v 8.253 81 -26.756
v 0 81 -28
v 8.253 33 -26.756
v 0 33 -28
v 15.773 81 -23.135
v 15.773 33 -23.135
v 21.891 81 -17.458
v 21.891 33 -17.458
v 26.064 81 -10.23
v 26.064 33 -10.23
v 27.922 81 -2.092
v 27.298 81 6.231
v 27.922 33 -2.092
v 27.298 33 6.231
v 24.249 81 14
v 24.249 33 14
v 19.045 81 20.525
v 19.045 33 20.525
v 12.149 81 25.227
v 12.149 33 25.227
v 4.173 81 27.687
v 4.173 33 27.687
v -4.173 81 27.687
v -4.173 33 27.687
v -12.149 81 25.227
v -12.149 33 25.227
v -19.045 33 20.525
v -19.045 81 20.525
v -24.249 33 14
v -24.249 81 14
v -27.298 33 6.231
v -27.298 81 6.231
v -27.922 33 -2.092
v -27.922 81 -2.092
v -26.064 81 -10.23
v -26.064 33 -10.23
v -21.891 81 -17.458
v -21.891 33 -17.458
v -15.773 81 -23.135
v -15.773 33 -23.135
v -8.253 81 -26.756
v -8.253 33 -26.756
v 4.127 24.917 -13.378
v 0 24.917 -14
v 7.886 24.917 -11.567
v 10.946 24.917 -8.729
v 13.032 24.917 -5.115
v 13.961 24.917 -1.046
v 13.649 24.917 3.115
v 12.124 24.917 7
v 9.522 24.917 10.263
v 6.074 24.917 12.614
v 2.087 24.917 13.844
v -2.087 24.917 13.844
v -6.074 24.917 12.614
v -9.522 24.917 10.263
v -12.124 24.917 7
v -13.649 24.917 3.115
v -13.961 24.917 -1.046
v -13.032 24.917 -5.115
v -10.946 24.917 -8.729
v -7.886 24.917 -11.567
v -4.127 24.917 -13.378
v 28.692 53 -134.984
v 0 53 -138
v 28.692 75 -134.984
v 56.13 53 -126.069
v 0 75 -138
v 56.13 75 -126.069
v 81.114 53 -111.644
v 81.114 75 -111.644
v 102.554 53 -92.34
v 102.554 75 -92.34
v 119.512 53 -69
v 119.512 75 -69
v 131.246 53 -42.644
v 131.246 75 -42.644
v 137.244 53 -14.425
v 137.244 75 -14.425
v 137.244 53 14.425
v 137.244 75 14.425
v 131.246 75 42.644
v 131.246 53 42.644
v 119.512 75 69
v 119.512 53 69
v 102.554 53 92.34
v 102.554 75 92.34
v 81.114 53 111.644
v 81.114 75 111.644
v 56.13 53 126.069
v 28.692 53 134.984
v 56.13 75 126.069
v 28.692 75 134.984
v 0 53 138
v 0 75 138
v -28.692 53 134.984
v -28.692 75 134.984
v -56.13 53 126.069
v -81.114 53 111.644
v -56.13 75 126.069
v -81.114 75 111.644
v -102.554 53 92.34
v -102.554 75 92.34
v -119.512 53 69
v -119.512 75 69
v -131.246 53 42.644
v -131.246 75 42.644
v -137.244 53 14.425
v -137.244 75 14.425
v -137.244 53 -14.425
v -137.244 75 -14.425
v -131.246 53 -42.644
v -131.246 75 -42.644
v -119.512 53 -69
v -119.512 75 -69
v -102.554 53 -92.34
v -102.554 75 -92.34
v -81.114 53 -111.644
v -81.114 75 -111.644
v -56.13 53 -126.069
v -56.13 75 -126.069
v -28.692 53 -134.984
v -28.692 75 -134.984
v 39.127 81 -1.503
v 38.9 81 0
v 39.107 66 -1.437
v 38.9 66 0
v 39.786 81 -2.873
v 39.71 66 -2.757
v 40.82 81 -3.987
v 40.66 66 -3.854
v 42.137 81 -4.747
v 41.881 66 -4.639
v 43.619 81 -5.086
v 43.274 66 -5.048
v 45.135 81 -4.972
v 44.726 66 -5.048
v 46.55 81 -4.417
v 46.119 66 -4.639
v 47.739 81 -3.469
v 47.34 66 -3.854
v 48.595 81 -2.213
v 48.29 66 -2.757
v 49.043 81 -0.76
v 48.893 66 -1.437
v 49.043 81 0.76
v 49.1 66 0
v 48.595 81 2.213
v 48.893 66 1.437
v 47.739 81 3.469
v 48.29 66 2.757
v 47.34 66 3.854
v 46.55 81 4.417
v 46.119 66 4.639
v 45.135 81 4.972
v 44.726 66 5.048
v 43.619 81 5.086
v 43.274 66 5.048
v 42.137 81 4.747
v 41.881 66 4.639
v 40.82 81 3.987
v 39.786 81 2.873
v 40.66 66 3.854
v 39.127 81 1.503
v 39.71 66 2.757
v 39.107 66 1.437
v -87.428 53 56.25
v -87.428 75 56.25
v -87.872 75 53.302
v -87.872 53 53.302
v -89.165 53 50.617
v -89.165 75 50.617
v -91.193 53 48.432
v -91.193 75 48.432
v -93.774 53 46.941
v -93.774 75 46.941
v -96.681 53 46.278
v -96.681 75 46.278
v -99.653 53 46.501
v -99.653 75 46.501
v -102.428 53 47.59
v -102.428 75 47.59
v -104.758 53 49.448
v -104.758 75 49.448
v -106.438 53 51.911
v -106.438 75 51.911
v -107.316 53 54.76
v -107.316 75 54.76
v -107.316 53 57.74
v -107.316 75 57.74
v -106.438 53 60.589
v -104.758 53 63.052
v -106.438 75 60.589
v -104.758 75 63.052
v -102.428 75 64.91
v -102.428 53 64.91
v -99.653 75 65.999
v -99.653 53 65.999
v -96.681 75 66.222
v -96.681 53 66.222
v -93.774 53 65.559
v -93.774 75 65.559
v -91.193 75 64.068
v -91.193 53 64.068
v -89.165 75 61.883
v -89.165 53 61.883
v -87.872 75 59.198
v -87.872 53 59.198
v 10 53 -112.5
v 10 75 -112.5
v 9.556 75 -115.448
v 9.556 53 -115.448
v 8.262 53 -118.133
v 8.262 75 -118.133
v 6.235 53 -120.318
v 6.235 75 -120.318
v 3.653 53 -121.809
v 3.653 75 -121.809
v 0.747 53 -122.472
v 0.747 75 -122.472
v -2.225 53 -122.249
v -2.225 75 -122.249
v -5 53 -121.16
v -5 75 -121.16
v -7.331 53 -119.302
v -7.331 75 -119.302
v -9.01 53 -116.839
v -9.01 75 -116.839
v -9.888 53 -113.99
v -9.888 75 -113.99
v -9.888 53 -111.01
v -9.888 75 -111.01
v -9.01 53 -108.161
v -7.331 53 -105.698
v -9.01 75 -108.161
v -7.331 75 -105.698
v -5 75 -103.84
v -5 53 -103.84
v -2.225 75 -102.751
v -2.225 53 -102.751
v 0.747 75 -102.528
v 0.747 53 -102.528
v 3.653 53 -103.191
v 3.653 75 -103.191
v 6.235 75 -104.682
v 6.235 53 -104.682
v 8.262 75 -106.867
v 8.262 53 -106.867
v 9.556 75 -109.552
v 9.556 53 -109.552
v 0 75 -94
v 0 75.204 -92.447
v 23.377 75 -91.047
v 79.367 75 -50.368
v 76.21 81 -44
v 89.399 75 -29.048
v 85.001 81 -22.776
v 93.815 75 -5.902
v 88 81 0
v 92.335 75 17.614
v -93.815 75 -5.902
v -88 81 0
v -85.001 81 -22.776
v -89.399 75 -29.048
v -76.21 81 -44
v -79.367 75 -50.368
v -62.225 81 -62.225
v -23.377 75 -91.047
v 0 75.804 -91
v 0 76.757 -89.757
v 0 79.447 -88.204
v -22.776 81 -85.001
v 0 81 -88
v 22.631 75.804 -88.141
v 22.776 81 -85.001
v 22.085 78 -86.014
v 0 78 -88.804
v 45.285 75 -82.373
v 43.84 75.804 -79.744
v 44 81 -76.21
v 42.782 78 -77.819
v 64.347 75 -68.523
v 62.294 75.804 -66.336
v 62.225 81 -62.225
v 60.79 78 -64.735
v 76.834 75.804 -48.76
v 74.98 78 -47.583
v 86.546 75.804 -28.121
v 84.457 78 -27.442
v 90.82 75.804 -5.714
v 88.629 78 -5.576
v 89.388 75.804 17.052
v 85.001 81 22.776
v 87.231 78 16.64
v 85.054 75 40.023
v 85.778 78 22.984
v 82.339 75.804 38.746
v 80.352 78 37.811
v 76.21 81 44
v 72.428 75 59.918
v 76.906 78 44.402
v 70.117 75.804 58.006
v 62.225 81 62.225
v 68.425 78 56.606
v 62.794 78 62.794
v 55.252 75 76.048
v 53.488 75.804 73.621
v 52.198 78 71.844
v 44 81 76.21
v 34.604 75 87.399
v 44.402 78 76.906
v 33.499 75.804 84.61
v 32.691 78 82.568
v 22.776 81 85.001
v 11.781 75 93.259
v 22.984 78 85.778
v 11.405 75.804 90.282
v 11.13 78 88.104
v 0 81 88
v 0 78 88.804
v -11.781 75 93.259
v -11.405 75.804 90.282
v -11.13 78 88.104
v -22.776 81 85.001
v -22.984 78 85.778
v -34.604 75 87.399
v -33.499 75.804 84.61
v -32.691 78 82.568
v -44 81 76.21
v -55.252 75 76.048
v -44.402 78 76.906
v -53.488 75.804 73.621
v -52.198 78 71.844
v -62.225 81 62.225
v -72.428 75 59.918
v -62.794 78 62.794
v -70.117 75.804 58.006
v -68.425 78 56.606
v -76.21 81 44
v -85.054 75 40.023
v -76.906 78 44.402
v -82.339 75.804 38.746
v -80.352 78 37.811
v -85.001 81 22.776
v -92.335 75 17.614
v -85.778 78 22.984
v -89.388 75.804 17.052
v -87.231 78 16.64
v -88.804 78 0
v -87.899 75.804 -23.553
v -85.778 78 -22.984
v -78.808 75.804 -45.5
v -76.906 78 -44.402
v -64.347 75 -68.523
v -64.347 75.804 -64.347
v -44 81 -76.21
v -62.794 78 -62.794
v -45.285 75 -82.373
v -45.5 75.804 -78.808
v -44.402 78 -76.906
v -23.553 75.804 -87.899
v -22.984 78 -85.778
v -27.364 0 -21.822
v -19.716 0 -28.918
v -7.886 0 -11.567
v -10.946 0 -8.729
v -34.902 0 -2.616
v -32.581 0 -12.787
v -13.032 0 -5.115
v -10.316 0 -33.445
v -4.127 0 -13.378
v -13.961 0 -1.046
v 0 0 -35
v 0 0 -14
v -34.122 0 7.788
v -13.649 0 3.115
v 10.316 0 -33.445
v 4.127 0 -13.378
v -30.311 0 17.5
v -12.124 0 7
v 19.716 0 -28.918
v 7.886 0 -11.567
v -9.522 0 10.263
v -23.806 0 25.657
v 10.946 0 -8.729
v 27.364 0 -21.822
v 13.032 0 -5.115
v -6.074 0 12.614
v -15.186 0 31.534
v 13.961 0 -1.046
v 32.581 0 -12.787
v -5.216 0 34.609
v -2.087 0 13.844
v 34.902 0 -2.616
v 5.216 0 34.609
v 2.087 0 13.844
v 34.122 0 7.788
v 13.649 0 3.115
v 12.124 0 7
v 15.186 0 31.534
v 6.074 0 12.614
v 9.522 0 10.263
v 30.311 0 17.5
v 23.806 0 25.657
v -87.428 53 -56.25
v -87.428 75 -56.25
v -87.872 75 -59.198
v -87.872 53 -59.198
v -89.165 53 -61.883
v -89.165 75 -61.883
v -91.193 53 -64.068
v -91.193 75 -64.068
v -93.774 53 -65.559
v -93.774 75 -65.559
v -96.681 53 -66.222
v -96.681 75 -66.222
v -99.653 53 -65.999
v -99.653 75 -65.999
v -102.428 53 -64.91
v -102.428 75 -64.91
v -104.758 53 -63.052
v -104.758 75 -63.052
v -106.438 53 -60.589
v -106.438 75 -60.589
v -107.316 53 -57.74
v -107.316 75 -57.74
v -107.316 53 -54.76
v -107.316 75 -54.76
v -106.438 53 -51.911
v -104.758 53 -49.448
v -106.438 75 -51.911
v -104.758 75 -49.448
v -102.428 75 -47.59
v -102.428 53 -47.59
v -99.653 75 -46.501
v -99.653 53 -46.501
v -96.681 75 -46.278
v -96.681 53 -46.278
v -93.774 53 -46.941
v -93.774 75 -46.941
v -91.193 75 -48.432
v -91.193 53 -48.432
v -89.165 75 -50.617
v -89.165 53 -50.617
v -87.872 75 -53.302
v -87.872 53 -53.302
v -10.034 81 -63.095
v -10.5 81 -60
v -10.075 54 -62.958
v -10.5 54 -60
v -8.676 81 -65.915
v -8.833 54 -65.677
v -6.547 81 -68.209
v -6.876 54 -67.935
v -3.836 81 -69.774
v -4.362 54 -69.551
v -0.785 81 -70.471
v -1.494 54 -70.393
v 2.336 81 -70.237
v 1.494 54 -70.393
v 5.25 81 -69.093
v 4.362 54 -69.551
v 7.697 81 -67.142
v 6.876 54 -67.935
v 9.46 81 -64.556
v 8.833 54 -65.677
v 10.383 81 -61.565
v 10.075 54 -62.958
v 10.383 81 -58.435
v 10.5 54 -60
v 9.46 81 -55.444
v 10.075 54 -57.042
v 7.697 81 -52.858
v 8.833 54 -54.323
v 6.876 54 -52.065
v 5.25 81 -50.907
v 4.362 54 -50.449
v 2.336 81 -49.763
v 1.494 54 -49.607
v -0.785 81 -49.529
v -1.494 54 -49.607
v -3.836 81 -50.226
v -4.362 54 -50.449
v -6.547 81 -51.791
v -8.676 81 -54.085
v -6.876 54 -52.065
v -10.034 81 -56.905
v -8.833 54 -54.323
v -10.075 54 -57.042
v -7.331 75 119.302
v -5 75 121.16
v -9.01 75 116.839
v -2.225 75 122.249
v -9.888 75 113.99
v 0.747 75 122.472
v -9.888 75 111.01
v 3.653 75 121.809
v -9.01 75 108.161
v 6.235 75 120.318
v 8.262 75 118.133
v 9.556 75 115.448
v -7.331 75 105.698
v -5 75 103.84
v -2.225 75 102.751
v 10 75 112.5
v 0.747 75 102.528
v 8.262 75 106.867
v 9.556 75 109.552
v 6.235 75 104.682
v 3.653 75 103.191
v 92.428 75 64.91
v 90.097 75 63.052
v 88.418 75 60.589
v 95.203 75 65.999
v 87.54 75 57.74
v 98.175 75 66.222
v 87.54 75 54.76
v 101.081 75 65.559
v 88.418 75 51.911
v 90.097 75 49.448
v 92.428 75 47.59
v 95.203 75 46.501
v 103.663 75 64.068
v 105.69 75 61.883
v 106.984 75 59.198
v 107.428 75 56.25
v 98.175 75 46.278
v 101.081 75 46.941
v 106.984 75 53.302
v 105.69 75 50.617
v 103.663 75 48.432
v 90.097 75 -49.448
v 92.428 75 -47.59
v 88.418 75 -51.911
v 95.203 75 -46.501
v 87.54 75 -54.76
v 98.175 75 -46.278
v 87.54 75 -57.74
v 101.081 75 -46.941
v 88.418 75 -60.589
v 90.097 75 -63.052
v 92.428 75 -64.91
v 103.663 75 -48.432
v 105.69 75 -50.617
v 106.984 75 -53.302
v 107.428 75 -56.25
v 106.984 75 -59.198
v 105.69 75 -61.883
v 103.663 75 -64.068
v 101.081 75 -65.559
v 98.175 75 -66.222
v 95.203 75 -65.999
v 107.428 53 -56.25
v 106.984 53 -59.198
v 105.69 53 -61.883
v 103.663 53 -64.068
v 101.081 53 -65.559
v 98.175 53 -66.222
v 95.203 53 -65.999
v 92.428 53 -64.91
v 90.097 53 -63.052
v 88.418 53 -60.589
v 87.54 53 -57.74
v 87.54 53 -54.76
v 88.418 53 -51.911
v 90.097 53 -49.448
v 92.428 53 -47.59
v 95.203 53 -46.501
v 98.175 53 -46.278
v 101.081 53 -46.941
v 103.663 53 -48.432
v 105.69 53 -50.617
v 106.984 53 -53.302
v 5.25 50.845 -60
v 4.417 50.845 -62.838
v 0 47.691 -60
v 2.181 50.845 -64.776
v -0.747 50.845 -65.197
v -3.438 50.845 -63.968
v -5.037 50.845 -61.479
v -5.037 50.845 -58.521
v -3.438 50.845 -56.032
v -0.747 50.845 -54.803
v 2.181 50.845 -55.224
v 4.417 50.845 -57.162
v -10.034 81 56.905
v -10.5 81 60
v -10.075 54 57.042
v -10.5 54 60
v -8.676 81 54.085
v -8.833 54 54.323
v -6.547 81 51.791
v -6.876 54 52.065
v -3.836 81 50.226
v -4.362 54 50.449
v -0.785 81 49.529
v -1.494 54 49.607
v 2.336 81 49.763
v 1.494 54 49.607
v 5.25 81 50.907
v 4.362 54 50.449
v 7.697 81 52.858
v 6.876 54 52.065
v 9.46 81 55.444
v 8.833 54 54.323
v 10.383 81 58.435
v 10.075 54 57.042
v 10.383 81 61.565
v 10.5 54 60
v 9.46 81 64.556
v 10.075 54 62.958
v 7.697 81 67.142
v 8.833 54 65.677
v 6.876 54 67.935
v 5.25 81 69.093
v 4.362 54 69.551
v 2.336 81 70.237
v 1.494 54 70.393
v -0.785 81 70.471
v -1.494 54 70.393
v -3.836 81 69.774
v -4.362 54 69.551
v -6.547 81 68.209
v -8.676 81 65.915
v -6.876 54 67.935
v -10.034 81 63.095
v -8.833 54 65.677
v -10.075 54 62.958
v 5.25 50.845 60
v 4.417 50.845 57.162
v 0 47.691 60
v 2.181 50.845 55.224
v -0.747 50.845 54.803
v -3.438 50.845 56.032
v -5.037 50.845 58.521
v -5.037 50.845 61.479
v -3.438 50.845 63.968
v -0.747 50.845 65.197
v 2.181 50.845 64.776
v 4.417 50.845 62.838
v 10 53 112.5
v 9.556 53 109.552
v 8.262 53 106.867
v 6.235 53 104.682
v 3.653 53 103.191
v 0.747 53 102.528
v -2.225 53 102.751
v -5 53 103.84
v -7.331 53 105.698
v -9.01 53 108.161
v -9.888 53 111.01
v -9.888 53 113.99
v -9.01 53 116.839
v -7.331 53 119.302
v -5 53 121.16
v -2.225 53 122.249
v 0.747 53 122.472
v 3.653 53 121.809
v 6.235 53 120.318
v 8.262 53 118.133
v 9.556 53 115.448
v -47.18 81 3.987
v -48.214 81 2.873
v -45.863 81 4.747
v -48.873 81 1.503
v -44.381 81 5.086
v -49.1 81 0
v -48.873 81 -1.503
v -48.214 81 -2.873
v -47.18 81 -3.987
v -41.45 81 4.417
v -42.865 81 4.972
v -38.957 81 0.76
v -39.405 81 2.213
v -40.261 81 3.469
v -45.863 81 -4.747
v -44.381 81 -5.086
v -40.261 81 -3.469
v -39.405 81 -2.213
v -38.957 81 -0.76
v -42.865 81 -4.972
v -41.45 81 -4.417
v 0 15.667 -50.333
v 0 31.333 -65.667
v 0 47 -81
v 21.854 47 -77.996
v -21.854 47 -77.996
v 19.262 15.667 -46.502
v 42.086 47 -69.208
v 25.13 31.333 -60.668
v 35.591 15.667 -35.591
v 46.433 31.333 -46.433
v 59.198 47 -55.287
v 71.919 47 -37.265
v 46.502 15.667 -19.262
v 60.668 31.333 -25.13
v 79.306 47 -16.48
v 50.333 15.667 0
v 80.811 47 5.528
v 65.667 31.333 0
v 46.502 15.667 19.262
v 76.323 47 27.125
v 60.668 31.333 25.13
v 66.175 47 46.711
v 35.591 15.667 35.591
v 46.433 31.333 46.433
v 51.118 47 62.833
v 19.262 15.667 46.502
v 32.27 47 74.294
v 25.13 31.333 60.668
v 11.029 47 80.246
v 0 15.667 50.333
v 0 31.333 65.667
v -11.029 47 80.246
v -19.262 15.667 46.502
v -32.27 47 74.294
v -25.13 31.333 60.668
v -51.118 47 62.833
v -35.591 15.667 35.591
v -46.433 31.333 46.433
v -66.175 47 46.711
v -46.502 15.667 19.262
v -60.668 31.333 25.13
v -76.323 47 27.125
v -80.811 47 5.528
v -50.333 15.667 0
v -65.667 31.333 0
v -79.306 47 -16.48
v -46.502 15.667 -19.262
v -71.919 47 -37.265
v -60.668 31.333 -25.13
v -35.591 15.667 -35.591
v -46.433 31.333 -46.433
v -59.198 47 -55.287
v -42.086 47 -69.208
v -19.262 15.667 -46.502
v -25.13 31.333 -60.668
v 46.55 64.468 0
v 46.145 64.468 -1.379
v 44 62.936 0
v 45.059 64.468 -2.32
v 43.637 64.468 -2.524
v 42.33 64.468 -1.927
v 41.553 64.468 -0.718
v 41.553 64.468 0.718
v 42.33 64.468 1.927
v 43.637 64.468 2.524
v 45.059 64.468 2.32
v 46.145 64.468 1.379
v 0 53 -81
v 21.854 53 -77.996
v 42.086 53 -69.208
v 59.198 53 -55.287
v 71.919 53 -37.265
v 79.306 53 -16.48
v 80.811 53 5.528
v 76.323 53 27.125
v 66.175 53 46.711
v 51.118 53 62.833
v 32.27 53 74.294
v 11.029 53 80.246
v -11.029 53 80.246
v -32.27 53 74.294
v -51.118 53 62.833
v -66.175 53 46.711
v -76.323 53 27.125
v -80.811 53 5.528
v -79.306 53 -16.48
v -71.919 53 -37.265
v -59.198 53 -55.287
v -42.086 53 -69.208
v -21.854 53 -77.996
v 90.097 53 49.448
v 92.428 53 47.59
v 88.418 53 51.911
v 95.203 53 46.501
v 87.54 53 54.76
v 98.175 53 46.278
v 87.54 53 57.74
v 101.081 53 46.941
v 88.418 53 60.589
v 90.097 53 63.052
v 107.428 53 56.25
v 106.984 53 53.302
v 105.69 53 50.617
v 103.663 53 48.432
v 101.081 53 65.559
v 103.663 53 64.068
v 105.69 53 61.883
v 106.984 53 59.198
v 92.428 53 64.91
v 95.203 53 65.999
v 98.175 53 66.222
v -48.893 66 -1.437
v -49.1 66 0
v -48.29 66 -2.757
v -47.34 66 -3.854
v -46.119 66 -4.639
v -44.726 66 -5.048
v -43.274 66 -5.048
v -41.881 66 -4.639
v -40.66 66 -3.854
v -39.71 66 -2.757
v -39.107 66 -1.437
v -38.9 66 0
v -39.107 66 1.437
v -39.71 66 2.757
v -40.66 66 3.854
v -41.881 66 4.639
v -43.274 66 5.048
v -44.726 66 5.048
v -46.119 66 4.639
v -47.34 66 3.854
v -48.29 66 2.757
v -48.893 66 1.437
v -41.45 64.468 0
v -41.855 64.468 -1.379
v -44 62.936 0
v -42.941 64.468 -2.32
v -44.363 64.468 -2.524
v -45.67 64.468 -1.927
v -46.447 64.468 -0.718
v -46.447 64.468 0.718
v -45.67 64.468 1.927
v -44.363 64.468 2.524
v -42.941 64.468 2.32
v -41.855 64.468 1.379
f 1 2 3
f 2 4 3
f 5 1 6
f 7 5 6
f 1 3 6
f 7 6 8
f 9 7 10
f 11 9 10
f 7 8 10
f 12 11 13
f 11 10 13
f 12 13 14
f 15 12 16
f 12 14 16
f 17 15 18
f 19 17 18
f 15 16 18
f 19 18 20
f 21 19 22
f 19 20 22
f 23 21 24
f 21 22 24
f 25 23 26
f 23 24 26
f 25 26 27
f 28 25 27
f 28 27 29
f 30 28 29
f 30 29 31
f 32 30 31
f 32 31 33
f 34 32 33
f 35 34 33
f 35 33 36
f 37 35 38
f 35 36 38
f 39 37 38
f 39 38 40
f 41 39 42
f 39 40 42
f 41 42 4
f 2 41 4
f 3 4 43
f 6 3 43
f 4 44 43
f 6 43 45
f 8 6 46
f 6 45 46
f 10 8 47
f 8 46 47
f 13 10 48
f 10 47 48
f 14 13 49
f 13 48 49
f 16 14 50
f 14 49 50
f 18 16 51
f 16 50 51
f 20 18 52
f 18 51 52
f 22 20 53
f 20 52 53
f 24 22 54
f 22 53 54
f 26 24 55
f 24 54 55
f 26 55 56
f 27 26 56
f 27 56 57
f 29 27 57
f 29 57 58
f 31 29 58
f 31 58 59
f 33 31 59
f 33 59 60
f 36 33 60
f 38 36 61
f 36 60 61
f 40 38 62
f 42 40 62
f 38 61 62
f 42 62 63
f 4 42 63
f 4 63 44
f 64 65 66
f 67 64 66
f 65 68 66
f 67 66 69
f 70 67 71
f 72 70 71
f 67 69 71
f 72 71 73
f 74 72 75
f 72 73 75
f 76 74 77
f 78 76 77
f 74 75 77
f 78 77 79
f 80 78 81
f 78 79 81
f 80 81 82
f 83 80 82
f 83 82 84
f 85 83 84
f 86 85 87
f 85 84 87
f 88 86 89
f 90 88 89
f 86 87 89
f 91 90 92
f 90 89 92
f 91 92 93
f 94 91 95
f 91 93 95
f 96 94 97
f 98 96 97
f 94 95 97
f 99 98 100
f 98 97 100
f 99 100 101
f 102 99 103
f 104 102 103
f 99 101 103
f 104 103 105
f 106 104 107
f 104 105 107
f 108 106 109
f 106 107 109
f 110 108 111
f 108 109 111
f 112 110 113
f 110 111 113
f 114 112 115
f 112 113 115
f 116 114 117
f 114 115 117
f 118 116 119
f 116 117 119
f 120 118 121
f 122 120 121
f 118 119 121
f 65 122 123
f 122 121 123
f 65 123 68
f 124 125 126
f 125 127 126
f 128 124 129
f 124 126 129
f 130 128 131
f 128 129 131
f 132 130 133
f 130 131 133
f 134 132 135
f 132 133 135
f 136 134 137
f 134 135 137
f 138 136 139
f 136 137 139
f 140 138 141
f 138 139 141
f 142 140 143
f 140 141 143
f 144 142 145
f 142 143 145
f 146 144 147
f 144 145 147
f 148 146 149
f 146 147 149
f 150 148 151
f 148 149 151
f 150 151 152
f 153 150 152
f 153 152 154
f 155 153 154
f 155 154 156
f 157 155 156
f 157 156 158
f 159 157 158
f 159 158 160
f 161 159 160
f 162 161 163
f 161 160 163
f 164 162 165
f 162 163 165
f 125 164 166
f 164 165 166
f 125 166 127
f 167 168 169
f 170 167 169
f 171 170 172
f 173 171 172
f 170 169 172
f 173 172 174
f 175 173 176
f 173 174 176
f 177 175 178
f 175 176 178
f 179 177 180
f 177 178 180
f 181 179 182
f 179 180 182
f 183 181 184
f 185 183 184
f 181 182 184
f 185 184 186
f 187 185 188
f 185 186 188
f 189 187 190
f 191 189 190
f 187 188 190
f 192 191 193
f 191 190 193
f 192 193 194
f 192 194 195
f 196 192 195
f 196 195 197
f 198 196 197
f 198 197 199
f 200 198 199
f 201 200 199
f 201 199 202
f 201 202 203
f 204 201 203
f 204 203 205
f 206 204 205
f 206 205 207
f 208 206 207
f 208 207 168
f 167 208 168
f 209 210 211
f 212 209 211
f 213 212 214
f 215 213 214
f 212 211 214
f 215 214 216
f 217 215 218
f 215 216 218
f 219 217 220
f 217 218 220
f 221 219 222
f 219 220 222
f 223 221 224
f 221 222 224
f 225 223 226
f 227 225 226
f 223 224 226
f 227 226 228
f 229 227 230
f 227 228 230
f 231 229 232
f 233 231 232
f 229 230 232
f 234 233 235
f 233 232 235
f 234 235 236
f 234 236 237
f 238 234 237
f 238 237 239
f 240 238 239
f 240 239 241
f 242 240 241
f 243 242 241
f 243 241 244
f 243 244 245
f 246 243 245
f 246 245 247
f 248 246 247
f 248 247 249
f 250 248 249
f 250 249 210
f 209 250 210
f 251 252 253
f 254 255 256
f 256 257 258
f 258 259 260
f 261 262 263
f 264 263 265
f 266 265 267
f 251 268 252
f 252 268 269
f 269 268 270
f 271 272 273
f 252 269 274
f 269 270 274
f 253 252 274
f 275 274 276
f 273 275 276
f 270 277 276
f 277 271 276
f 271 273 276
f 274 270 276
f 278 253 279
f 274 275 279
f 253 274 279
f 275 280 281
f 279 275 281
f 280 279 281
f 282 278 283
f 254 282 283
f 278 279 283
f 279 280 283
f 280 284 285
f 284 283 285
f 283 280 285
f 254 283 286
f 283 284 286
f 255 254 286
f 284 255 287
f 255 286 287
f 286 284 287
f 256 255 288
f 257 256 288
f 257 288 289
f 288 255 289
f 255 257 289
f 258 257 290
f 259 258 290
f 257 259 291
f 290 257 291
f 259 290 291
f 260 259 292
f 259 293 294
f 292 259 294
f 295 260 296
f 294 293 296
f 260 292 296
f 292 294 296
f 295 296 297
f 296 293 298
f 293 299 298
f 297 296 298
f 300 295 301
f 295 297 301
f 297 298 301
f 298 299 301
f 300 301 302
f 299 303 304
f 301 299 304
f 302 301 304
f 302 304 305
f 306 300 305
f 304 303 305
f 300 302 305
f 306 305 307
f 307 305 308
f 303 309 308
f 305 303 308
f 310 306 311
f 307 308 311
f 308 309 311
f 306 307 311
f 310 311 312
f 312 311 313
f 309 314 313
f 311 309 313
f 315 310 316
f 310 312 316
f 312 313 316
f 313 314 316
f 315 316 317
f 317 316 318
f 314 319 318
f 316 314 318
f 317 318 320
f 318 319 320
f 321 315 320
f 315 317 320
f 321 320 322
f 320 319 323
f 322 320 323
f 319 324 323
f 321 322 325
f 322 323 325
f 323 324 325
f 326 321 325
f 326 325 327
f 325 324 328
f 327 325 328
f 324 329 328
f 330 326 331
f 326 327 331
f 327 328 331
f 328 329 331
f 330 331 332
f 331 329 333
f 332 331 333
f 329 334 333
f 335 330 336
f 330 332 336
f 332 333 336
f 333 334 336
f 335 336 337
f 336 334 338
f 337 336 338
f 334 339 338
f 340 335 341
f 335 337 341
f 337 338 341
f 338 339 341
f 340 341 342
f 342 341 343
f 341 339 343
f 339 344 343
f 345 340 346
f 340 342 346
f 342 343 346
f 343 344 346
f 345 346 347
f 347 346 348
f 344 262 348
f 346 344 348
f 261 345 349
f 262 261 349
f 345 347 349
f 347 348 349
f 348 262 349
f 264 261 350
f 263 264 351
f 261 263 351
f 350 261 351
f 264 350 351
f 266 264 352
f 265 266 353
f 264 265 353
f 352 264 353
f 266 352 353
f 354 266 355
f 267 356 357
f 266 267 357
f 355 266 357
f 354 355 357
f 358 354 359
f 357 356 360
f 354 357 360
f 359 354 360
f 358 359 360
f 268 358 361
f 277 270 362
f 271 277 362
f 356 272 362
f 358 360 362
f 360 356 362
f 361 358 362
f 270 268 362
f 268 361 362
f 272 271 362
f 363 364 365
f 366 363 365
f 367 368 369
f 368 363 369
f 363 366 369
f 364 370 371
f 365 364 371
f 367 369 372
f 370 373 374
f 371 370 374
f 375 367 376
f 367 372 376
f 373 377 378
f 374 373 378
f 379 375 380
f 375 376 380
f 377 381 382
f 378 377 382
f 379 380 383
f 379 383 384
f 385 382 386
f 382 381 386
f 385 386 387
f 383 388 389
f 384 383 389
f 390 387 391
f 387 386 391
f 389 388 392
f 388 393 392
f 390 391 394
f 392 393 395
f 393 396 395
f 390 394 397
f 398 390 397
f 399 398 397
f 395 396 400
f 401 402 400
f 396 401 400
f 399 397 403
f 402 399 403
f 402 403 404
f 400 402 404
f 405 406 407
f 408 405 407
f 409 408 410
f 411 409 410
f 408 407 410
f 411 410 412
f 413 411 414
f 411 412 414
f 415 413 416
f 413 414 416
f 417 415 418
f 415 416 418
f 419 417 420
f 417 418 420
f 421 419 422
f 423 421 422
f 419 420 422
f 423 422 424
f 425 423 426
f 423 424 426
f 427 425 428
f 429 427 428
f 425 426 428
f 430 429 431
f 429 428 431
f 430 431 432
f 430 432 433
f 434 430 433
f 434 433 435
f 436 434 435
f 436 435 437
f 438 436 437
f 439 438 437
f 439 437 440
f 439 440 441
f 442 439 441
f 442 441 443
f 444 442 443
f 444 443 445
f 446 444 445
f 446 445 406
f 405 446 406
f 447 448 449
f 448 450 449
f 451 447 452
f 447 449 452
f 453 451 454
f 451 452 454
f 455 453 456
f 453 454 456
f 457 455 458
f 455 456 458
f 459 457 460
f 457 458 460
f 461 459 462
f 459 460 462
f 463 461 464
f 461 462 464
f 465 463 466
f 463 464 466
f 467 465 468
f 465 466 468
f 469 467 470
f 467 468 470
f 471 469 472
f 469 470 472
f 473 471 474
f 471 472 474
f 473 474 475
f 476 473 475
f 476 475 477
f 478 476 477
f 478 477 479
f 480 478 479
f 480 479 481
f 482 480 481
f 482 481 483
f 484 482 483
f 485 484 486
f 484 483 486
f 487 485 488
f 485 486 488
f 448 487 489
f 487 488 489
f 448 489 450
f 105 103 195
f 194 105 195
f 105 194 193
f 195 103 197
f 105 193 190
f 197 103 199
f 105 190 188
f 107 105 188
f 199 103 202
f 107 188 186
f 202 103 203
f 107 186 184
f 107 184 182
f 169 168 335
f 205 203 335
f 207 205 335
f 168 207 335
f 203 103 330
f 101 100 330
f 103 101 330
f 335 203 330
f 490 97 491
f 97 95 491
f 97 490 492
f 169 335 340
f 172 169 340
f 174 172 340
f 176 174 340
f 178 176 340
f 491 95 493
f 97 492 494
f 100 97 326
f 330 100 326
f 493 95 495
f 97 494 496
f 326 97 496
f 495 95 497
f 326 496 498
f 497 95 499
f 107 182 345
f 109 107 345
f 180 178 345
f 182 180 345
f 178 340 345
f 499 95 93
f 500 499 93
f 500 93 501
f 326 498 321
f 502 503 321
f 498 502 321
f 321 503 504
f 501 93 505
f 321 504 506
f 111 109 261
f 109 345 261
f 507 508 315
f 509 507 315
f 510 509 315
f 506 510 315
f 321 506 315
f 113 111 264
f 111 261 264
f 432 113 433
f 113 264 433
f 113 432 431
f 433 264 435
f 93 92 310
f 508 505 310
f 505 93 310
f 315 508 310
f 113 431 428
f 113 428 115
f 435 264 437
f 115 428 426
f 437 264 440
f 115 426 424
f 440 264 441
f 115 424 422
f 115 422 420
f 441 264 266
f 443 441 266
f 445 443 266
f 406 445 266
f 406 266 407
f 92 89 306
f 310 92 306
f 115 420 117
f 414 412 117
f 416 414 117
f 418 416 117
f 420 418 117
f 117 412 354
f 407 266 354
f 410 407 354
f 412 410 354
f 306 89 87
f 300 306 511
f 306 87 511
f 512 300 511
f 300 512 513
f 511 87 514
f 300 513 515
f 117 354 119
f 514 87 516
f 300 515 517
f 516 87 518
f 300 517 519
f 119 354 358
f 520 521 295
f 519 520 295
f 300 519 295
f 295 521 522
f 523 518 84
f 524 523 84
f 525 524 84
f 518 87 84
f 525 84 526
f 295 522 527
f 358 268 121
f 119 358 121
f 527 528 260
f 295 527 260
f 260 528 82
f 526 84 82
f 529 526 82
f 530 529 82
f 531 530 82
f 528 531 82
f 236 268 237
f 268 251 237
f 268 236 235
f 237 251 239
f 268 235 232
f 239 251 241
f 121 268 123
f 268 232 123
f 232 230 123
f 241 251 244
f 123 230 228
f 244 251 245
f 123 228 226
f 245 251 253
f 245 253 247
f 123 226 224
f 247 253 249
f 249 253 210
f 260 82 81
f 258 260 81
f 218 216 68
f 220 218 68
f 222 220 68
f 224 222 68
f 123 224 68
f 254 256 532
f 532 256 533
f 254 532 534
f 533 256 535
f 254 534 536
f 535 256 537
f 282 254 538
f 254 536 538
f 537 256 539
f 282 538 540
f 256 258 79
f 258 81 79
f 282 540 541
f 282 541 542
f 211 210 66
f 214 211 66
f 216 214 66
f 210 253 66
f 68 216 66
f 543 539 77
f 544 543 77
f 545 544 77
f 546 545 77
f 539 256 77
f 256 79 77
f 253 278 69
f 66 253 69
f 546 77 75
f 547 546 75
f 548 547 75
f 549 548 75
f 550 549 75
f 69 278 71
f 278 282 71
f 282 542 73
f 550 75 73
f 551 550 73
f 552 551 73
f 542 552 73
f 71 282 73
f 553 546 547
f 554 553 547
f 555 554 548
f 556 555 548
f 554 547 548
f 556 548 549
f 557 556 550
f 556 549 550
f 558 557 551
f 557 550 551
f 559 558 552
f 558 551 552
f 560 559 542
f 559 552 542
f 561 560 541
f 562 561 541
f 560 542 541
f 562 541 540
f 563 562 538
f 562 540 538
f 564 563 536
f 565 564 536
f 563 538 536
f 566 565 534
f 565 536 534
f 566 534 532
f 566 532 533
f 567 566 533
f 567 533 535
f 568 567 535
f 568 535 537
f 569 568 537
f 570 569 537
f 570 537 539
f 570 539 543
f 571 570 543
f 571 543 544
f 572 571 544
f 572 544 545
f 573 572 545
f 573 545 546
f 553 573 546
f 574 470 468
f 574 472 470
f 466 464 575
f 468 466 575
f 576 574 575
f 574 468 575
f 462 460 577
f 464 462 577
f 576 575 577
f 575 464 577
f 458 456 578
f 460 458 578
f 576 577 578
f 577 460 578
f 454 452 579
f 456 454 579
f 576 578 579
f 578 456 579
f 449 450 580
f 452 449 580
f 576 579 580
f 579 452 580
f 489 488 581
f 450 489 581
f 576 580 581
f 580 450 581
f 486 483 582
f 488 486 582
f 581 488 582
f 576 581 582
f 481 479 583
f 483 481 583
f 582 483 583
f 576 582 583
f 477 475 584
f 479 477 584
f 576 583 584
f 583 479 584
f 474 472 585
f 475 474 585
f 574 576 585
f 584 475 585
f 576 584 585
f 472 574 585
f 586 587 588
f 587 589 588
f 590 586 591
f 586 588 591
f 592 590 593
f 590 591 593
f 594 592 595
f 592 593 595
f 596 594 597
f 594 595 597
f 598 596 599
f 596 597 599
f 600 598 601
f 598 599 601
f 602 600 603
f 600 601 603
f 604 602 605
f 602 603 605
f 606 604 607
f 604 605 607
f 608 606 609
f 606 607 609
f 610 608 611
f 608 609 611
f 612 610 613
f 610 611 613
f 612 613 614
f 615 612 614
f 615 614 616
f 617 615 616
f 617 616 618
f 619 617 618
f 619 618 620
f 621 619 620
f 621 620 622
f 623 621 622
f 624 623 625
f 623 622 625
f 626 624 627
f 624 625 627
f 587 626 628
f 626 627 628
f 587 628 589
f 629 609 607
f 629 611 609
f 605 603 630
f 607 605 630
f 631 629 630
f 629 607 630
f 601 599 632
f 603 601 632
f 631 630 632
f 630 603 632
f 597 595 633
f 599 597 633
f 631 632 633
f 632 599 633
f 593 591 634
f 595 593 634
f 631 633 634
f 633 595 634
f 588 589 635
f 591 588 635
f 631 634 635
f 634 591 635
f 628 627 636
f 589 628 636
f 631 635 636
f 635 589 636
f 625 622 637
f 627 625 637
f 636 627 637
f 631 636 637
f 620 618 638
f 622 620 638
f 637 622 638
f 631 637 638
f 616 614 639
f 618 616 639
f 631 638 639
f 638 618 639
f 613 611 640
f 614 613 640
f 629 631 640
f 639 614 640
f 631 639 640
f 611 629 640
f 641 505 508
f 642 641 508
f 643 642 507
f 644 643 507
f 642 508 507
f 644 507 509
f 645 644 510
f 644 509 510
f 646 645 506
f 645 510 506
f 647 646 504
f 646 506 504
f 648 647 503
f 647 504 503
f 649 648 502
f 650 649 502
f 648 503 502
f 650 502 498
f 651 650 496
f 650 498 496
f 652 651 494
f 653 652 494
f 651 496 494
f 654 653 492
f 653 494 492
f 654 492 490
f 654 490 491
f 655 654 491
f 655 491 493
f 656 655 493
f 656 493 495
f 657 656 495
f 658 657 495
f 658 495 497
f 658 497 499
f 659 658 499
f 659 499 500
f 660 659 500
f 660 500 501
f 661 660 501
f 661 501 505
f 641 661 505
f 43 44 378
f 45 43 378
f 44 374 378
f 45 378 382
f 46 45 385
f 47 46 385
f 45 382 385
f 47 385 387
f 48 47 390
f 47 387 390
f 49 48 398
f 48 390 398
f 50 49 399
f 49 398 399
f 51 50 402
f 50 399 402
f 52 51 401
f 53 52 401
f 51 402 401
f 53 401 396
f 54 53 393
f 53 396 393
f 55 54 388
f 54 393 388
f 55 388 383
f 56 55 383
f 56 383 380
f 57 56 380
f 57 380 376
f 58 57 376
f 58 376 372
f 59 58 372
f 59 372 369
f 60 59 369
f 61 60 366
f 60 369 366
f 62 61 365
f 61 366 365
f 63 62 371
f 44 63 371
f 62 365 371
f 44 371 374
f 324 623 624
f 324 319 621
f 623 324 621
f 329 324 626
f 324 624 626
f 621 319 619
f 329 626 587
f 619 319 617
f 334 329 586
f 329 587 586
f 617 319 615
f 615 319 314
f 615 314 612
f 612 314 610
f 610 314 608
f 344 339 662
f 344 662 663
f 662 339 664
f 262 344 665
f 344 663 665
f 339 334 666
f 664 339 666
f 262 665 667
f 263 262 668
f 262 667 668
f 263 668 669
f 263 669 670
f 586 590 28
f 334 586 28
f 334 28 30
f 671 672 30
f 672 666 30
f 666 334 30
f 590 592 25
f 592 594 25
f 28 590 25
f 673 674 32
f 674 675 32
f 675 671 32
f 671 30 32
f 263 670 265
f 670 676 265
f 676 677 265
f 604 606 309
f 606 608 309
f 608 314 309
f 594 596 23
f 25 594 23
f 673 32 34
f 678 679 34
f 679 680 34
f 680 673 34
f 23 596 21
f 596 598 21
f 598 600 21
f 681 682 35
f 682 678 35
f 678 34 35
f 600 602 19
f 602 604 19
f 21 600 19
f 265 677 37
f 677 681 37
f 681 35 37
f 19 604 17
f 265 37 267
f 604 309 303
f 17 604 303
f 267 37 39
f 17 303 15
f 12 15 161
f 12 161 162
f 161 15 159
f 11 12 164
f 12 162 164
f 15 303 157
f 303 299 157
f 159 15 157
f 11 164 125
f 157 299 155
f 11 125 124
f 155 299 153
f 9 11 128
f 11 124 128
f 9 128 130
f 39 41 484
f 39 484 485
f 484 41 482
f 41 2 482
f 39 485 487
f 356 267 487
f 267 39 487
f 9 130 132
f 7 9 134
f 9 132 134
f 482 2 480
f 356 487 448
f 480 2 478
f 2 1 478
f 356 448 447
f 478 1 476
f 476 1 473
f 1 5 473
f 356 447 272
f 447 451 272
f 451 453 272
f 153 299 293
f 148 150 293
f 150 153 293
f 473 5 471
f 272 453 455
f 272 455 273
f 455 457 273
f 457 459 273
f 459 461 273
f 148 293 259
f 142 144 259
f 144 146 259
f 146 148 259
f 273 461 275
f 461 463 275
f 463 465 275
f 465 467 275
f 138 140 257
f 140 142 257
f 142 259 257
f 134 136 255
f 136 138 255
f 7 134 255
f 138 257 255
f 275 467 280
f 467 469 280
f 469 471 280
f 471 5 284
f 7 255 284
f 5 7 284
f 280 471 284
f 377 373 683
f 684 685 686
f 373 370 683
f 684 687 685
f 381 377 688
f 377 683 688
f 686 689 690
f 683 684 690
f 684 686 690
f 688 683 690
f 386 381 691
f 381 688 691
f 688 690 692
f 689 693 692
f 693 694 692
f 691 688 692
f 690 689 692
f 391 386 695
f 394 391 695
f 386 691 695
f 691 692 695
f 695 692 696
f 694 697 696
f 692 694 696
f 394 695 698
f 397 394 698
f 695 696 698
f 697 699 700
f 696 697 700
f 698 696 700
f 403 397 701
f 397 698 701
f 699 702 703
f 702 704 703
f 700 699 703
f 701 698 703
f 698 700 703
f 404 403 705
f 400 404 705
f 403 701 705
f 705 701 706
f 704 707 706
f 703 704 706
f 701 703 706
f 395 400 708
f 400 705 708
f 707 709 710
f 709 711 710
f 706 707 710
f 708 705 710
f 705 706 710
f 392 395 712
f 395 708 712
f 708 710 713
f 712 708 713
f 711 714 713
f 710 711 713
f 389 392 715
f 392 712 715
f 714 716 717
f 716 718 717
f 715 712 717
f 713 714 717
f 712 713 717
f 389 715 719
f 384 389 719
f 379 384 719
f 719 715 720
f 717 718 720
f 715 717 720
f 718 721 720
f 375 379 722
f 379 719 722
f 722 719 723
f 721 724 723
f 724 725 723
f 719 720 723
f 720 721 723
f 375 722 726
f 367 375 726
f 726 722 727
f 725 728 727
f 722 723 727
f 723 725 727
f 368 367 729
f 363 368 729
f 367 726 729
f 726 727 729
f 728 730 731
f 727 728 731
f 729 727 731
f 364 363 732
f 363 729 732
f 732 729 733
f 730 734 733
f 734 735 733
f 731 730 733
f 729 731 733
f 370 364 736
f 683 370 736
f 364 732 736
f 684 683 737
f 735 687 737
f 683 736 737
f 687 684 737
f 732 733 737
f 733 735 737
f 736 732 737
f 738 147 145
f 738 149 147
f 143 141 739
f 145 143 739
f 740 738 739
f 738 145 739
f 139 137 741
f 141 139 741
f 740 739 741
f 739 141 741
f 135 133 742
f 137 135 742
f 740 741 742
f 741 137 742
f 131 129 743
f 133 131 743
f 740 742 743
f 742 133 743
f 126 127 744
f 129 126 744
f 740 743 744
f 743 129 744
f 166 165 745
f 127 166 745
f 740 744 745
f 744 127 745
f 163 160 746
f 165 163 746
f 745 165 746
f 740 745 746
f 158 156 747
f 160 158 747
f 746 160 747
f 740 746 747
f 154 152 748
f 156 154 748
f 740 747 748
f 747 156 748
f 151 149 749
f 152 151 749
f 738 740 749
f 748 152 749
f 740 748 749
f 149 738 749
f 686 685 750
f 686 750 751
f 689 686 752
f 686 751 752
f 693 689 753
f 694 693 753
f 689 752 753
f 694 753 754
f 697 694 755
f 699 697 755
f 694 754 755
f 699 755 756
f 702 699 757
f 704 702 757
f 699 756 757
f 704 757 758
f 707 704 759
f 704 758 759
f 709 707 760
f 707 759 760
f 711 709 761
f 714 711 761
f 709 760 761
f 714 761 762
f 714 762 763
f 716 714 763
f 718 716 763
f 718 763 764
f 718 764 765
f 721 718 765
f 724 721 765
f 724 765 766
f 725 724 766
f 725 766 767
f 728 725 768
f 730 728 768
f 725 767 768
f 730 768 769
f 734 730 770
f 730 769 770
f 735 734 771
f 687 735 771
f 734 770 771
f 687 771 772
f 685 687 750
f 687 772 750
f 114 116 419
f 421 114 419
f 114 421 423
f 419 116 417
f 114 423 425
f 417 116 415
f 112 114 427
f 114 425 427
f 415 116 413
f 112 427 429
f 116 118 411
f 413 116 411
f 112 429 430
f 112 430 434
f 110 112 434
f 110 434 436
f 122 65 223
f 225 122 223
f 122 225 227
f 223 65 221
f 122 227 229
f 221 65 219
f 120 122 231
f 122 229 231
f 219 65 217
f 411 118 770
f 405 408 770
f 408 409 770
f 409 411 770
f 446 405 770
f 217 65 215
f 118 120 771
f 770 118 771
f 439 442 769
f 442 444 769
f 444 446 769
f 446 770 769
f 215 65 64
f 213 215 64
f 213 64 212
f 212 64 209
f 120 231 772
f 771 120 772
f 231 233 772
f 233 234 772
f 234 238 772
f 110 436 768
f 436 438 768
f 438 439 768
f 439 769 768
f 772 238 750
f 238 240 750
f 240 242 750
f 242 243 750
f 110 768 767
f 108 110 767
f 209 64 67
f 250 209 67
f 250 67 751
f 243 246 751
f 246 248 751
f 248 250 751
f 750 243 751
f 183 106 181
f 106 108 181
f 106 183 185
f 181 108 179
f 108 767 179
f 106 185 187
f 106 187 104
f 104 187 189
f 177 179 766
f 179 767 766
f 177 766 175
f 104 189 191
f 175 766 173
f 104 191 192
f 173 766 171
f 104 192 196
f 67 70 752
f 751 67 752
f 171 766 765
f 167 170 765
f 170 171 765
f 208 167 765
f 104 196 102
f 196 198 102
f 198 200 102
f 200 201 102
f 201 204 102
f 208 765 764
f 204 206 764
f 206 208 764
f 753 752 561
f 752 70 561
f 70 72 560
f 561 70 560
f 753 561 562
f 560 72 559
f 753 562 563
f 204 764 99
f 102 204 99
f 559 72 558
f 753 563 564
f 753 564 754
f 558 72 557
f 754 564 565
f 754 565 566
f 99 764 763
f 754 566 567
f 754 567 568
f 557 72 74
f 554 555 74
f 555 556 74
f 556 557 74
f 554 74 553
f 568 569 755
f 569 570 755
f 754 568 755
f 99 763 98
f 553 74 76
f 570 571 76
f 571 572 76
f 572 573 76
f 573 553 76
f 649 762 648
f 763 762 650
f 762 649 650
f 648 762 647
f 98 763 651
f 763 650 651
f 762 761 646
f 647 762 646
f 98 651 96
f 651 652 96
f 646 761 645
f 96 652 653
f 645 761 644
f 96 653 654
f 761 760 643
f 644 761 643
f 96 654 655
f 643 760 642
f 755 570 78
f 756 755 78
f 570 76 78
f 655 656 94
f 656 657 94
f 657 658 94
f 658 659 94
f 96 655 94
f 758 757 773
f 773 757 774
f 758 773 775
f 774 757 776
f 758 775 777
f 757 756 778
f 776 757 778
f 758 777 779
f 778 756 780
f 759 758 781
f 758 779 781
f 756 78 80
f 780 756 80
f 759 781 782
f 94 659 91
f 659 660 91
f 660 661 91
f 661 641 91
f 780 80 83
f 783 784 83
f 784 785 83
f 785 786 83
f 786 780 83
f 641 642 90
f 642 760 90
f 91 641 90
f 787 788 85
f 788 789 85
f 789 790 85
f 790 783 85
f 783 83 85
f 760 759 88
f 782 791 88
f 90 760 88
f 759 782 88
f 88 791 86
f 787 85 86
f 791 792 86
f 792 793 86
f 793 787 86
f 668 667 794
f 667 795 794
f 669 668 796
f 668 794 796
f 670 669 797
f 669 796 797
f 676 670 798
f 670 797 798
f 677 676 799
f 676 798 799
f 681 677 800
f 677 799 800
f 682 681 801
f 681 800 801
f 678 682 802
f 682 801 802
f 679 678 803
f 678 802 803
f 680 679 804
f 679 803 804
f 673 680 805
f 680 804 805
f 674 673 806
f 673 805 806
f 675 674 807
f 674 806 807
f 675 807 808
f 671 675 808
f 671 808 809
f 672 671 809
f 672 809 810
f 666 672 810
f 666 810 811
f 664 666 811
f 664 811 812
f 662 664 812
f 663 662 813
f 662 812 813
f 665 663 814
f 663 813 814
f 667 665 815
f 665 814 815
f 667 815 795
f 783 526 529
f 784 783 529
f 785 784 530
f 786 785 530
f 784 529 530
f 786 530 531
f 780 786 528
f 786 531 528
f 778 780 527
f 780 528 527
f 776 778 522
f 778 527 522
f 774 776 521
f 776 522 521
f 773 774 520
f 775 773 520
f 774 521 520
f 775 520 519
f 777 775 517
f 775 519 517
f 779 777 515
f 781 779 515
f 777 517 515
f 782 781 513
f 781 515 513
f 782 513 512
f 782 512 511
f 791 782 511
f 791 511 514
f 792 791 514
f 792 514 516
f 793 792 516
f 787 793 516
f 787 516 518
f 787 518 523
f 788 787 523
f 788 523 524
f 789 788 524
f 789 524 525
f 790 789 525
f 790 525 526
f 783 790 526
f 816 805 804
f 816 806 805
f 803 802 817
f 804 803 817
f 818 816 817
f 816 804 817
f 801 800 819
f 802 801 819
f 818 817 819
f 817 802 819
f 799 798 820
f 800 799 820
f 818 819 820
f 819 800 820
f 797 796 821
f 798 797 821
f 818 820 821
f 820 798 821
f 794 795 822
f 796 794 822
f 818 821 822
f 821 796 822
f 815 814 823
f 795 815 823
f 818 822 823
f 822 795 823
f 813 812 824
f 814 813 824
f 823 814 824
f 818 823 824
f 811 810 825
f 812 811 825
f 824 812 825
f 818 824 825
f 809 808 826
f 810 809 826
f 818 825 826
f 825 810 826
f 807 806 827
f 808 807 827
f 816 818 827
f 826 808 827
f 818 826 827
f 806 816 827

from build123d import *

# Parameters (mm, degrees)
SKETCH2_R              = 10
CUT_EXTRUDE1_DEPTH     = 76
M24_TAPPED_HOLE3_D     = 21
M24_TAPPED_HOLE3_DEPTH = 27
M24_TAPPED_HOLE3_TIP   = 6.3090365
M12_TAPPED_HOLE1_D     = 10.2
M12_TAPPED_HOLE1_DEPTH = 15
M12_TAPPED_HOLE1_TIP   = 3.064389157


with BuildPart() as part:
    # Sketch1 → Revolve1 (revolve)
    with BuildSketch(Plane(origin=(0, 0, 0), x_dir=(0, 0, -1), z_dir=(1, 0, 0))):
        with BuildLine():
            Line((14, 0), (35, 0))
            Line((35, 0), (81, 47))
            Line((81, 47), (81, 53))
            Line((81, 53), (138, 53))
            Line((138, 53), (138, 75))
            Line((138, 75), (94, 75))
            ThreePointArc((94, 75), (89.757359313, 76.757359313), (88, 81))
            Line((88, 81), (28, 81))
            Line((28, 81), (28, 33))
            Line((28, 33), (14, 24.917096231))
            Line((14, 24.917096231), (14, 0))
        make_face()
    revolve(axis=Axis((0, 40.822828071, 0), (0, -1, 0)))

    # Sketch2 → Cut-Extrude1 (cut, through all)
    with BuildSketch(Plane(origin=(0, 75, 0), x_dir=(1, 0, 0), z_dir=(0, 1, 0))):
        with Locations((0, 112.5)):
            Circle(SKETCH2_R)
        with Locations((97.427857926, 56.25)):
            Circle(SKETCH2_R)
        with Locations((97.427857926, -56.25)):
            Circle(SKETCH2_R)
        with Locations((0, -112.5)):
            Circle(SKETCH2_R)
        with Locations((-97.427857926, -56.25)):
            Circle(SKETCH2_R)
        with Locations((-97.427857926, 56.25)):
            Circle(SKETCH2_R)
    extrude(amount=-CUT_EXTRUDE1_DEPTH, mode=Mode.SUBTRACT)

    # M24 Tapped Hole3
    with Locations(Plane(origin=(0, 81, 0), x_dir=(1, 0, 0), z_dir=(0, 1, 0))):
        with Locations((0, 60), (0, -60), (-5.787213998, -5.032102647)):
            Hole(M24_TAPPED_HOLE3_D / 2, depth=M24_TAPPED_HOLE3_DEPTH)
            with Locations((0, 0, -(M24_TAPPED_HOLE3_DEPTH + M24_TAPPED_HOLE3_TIP / 2))):  # 118° drill point
                Cone(0, M24_TAPPED_HOLE3_D / 2, M24_TAPPED_HOLE3_TIP, mode=Mode.SUBTRACT)

    # M12 Tapped Hole1
    with Locations(Plane(origin=(0, 81, 0), x_dir=(1, 0, 0), z_dir=(0, 1, 0))):
        with Locations((-44, 0), (44, 0)):
            Hole(M12_TAPPED_HOLE1_D / 2, depth=M12_TAPPED_HOLE1_DEPTH)
            with Locations((0, 0, -(M12_TAPPED_HOLE1_DEPTH + M12_TAPPED_HOLE1_TIP / 2))):  # 118° drill point
                Cone(0, M12_TAPPED_HOLE1_D / 2, M12_TAPPED_HOLE1_TIP, mode=Mode.SUBTRACT)


solid = part.part
